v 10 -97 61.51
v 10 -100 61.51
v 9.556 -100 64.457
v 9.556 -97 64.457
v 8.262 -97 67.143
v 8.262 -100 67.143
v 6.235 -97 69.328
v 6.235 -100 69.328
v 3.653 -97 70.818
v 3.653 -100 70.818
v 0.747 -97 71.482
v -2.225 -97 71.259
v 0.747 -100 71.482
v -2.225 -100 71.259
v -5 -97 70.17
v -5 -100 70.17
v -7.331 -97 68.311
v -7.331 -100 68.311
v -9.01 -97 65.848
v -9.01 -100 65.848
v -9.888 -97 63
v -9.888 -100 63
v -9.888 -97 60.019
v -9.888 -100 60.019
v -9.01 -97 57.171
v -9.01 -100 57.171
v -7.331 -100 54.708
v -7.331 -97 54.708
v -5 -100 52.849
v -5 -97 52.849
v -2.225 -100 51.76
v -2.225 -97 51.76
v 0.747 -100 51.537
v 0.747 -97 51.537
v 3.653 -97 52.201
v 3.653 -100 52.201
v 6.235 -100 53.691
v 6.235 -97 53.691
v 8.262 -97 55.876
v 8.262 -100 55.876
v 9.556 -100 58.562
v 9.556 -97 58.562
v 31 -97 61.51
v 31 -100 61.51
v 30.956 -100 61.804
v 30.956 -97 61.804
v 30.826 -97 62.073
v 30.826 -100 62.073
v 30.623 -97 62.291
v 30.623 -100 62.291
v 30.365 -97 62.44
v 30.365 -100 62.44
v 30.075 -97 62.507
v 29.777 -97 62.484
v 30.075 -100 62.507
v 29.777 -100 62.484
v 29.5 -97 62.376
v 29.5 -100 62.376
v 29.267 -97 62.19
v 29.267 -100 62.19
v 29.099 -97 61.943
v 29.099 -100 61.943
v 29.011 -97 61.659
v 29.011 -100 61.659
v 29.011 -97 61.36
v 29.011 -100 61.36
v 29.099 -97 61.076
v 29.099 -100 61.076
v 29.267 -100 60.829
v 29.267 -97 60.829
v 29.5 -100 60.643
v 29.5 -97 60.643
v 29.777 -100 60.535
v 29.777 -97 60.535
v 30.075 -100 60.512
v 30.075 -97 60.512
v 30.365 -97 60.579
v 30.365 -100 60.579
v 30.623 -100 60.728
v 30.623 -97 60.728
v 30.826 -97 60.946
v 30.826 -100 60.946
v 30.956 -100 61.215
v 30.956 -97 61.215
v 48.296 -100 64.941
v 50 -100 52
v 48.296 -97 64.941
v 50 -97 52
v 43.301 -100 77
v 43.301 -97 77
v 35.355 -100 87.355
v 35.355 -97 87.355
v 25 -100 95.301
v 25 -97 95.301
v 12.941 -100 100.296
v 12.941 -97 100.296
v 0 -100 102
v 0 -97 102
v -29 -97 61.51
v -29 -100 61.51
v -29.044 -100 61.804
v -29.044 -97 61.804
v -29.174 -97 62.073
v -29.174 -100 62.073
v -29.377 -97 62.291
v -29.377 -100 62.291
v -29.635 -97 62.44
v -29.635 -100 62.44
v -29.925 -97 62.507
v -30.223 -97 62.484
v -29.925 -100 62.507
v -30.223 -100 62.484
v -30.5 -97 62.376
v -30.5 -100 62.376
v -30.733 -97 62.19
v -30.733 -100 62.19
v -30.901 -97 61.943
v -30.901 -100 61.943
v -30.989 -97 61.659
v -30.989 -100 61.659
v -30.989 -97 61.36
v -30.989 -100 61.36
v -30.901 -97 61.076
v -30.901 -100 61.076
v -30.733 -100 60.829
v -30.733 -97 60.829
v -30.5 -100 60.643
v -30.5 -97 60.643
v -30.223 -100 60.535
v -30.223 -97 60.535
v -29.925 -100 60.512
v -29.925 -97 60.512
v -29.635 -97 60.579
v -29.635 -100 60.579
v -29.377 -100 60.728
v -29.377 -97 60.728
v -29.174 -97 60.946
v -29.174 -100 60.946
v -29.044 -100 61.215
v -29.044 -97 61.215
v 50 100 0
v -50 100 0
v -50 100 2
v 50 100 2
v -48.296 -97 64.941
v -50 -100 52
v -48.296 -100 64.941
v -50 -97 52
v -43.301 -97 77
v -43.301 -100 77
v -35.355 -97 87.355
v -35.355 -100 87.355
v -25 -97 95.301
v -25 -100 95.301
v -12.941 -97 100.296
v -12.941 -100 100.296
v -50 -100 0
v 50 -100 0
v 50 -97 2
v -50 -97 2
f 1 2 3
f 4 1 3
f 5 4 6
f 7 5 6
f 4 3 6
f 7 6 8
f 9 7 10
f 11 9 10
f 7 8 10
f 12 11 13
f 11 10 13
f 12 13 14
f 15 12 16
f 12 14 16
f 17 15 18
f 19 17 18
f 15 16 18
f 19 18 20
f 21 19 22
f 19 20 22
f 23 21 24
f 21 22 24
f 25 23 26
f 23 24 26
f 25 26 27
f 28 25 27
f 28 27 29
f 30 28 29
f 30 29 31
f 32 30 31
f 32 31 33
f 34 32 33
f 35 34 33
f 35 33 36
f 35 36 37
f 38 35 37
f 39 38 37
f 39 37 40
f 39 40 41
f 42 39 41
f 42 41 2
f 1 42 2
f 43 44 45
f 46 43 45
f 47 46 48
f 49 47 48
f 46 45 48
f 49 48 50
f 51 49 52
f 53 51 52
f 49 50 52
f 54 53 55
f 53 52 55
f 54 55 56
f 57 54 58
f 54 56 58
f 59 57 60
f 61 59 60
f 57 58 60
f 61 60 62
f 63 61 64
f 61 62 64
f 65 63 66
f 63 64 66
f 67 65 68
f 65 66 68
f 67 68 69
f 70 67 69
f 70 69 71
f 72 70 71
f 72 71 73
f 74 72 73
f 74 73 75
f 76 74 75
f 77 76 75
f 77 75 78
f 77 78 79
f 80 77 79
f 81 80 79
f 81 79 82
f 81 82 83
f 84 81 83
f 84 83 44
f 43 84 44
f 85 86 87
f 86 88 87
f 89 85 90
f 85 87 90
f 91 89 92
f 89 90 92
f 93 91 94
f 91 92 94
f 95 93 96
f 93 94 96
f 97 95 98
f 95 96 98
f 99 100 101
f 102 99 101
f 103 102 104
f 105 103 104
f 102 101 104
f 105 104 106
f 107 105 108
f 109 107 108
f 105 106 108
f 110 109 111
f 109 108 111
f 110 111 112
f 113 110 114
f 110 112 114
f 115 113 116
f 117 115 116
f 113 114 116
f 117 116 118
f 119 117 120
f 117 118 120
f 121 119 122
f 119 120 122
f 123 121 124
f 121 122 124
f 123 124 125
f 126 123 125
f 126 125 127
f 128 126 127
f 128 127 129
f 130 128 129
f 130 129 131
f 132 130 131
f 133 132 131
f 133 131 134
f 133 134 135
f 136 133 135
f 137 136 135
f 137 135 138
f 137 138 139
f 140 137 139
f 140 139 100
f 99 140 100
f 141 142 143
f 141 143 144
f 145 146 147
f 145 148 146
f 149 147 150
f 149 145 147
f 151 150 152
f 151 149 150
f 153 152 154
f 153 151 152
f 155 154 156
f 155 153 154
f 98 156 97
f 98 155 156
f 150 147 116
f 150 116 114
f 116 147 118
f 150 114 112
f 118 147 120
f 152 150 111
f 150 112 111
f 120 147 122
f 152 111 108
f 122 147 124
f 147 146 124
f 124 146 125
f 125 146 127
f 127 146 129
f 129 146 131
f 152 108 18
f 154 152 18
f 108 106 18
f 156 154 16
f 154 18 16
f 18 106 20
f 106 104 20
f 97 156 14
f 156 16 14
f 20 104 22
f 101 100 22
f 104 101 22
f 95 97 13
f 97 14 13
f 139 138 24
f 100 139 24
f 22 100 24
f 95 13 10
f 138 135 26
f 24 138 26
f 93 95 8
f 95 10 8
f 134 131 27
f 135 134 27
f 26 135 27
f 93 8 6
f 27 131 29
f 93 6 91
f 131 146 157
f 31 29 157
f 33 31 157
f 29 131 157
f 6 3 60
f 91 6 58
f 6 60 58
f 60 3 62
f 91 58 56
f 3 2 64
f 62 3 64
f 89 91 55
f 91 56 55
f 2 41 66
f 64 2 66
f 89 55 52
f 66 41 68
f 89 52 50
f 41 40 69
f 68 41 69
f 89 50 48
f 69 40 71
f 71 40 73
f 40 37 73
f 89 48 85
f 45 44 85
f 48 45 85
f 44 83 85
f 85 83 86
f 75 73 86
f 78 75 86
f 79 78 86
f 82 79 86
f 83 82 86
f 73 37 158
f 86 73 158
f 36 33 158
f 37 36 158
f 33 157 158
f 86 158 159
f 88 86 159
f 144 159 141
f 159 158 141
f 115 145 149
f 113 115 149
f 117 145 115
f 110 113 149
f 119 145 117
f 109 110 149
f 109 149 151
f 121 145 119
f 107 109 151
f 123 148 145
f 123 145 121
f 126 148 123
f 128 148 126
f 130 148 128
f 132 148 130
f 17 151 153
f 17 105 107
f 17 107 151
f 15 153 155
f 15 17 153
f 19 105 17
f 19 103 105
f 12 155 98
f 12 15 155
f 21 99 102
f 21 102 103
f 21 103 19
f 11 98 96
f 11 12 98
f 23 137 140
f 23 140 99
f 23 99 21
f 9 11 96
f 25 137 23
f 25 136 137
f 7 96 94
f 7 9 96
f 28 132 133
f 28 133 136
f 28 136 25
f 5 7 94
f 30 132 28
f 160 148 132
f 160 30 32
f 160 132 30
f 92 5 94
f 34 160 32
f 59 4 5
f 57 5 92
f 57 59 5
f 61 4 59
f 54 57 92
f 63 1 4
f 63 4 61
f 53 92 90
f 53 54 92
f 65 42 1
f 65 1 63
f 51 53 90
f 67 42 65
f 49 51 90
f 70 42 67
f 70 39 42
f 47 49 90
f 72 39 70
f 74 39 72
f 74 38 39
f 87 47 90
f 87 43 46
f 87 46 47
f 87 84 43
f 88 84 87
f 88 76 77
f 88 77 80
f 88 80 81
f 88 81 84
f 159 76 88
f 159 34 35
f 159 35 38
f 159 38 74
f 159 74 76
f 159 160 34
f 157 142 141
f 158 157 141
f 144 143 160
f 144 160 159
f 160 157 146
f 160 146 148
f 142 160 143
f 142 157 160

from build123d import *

# Parameters (mm, degrees)
F0_W     = 100
F0_H     = 200
F1_DEPTH = 2
F2_W     = 100
F2_H     = 3
F3_DEPTH = 100
F4_R     = 49.99999
F5_R     = 10
F6_DEPTH = 25
F5_R_2   = 1
F7_DEPTH = 25


# Not quite as in the source:
# - a fillet or chamfer is up to 0.001 mm smaller than in the source, because OpenCascade refuses the exact size


with BuildPart() as f1:
    # F0 (on Top) → F1 (new body)
    with BuildSketch(Plane.XY):
        Rectangle(F0_W, F0_H)
    extrude(amount=F1_DEPTH)

    # F2 (on face) → F3 (join)
    with BuildSketch(Plane.XY.offset(2)):
        with Locations((0, -98.5)):
            Rectangle(F2_W, F2_H)
    extrude(amount=F3_DEPTH)

    # F4 (radius 50 in the source; OpenCascade refuses exactly that, so slightly less here)
    f4_edges = [f1.edges().sort_by_distance(p)[0] for p in [
        (-50, -98.5, 102),
        (50, -98.5, 102),
    ]]
    fillet(f4_edges, radius=F4_R)

    # F5 (on face) → F6 (cut)
    with BuildSketch(Plane.XZ.offset(100)):
        with Locations((0, 61.5095198154)):
            Circle(F5_R)
    extrude(amount=-F6_DEPTH, mode=Mode.SUBTRACT)

    # F5 (on face) → F7 (cut)
    with BuildSketch(Plane.XZ.offset(100)):
        with Locations((0, 61.5095198154)):
            Circle(F5_R)
        with Locations((30, 61.5095198154)):
            Circle(F5_R_2)
        with Locations((-30, 61.5095198154)):
            Circle(F5_R_2)
    extrude(amount=-F7_DEPTH, mode=Mode.SUBTRACT)


solid = f1.part
